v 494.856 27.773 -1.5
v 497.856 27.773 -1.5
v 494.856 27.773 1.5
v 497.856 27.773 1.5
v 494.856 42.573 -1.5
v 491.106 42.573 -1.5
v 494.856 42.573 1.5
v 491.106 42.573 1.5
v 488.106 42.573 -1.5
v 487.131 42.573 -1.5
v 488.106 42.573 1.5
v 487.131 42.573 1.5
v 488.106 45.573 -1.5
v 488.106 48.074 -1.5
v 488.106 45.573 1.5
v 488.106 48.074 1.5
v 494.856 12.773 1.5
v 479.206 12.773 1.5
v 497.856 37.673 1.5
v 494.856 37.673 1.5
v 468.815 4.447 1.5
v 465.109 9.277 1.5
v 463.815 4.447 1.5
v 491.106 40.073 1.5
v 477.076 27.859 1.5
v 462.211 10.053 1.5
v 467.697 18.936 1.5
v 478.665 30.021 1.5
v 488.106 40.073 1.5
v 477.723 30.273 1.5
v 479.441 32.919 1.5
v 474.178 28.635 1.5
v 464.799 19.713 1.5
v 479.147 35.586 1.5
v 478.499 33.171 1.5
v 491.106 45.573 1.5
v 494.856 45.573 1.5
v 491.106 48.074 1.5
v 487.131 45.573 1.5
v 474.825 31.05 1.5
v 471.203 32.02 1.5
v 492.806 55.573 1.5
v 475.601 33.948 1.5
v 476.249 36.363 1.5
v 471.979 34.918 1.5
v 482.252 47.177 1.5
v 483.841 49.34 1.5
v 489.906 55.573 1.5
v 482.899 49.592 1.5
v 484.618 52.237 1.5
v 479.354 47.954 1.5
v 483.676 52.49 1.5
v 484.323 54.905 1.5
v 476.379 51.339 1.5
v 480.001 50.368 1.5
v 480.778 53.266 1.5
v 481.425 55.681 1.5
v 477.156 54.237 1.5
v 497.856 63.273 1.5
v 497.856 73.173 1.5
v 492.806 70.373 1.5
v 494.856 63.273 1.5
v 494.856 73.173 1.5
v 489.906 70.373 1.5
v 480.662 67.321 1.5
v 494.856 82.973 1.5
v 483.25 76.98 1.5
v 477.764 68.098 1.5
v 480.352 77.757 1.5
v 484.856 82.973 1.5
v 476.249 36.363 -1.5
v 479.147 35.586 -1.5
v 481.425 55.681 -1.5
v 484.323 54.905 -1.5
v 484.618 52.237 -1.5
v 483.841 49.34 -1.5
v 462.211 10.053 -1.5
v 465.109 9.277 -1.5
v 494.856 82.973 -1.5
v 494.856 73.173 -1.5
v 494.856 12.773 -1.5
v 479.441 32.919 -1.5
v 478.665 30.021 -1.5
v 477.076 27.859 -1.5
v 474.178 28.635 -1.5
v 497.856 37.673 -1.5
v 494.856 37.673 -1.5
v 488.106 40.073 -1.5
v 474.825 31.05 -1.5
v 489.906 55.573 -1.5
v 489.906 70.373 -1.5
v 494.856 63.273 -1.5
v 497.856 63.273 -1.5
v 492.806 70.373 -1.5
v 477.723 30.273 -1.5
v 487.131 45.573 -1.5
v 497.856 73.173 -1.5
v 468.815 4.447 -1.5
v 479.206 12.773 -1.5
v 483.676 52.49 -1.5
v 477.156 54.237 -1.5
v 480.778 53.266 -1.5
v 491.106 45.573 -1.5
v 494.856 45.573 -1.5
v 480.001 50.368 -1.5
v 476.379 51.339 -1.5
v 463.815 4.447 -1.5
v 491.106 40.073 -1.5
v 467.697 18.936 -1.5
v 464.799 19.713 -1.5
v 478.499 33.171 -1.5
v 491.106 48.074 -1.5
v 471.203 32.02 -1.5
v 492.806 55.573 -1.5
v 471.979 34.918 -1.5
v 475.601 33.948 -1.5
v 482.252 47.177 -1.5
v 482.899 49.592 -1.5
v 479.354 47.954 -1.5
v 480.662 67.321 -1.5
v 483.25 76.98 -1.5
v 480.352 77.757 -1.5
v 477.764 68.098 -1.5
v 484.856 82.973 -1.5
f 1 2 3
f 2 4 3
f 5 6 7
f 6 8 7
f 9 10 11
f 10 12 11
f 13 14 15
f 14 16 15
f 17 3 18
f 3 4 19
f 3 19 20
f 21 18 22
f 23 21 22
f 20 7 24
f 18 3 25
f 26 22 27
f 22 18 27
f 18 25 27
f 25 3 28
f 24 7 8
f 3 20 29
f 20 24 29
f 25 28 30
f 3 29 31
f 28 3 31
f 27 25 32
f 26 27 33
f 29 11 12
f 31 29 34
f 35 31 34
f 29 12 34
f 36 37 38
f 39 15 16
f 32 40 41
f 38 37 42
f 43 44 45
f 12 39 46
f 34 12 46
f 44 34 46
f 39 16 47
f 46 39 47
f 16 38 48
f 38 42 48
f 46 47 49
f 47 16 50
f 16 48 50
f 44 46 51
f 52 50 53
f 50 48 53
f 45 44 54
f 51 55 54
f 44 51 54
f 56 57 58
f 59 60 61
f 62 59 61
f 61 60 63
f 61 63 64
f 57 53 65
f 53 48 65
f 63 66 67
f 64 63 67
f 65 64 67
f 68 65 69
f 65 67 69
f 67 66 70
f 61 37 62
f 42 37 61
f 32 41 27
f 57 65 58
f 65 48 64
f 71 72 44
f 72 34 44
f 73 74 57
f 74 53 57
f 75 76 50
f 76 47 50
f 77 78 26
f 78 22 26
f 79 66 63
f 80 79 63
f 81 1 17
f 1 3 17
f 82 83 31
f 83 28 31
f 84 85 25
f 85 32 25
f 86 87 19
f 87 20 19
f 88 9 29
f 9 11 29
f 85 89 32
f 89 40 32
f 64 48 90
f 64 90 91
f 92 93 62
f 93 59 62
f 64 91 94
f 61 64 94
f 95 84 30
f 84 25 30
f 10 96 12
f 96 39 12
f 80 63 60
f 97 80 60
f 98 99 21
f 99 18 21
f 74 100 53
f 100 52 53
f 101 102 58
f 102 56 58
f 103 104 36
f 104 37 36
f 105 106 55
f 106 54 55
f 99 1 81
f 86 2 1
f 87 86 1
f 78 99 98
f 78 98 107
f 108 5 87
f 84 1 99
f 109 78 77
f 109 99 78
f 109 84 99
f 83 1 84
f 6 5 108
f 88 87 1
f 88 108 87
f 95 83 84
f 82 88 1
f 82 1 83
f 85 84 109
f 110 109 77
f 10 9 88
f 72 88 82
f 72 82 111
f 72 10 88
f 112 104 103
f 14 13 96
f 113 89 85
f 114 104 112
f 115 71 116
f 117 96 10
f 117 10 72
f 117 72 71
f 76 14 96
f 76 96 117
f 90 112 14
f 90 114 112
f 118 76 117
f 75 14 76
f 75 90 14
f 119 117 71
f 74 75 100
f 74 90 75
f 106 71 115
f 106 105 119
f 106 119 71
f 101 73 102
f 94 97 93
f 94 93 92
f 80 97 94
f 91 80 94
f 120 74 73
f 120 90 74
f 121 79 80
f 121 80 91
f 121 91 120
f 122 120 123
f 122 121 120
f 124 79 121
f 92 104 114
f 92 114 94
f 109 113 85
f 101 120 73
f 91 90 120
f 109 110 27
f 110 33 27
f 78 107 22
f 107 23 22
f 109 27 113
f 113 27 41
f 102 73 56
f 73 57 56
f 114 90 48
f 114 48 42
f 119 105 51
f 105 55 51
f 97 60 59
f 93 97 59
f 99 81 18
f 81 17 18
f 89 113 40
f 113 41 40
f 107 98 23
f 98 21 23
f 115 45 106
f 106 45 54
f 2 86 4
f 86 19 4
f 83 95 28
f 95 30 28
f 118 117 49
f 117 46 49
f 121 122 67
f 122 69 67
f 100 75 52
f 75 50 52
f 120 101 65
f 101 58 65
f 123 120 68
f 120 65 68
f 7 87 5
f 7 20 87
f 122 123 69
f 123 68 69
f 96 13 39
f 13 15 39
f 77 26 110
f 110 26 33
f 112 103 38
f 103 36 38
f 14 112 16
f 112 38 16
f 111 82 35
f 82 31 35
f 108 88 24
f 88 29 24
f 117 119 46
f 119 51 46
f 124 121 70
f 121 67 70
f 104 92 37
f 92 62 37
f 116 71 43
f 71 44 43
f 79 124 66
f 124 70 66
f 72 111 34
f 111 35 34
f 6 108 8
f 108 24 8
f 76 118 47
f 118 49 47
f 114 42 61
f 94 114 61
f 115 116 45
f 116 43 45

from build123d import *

# Parameters (mm, degrees)
SALIENTE_EXTRUIR1_DEPTH = 1.5
CROQUIS2_W              = 2.9
CROQUIS2_H              = 14.8
CORTAR_EXTRUIR1_DEPTH   = 10


with BuildPart() as part:
    # Croquis1 → Saliente-Extruir1 (new, symmetric)
    with BuildSketch(Plane.XY):
        Polygon((497.855720503, 73.173038091), (497.855720503, 63.273038097), (494.855720505, 63.273038097), (494.855720505, 45.573091251), (491.106069484, 45.573091251), (491.106069484, 48.073510022), (488.105720509, 48.073510022), (488.105720509, 45.573091251), (487.13072051, 45.573091251), (487.13072051, 42.573091253), (488.105720509, 42.573091253), (488.105720509, 40.073091254), (491.106069484, 40.073091254), (491.106069484, 42.573091253), (494.855720505, 42.573091253), (494.855720505, 41.050309336), (494.855720505, 40.650309337), (494.855720505, 37.67310897), (497.855691931, 37.67310897), (497.855691931, 27.773108976), (494.855720505, 27.773108976), (494.855720505, 12.773108985), (479.205555648, 12.773108985), (468.814796849, 4.447241951), (463.814796852, 4.447241951), (465.108892077, 9.276871079), (462.2111146, 10.053328214), (464.799305049, 19.712586471), (467.697082526, 18.936129336), (471.203015891, 32.02045078), (474.824900651, 31.049969683), (474.177853039, 28.635155119), (477.075967602, 27.858607662), (477.723015214, 30.273422227), (478.664792894, 30.021073658), (479.441250029, 32.918851135), (478.499472349, 33.171199704), (479.146628347, 35.586418771), (476.248513785, 36.362966228), (475.601357786, 33.94774716), (471.979473025, 34.918228257), (476.379396799, 51.33896733), (480.001281419, 50.368486271), (479.354233806, 47.953671707), (482.252348369, 47.177124251), (482.899395981, 49.591938815), (483.841173662, 49.339590246), (484.617630796, 52.237367723), (483.675853116, 52.489716292), (484.323009115, 54.904935359), (481.424894552, 55.681482816), (480.777738553, 53.266263749), (477.155853934, 54.236744807), (480.661787289, 67.321066215), (477.764009811, 68.097523349), (480.352200261, 77.756781606), (483.249977738, 76.980324471), (484.855720511, 82.973038085), (494.855720505, 82.973038085), (494.855720505, 73.173038091), align=None)
    extrude(amount=SALIENTE_EXTRUIR1_DEPTH, both=True)

    # Croquis2 → Cortar-Extruir1 (cut)
    with BuildSketch(Plane.XY.offset(1.5)):
        with Locations((491.355720503, 62.973038085)):
            Rectangle(CROQUIS2_W, CROQUIS2_H)
    extrude(amount=-CORTAR_EXTRUIR1_DEPTH, mode=Mode.SUBTRACT)


solid = part.part
